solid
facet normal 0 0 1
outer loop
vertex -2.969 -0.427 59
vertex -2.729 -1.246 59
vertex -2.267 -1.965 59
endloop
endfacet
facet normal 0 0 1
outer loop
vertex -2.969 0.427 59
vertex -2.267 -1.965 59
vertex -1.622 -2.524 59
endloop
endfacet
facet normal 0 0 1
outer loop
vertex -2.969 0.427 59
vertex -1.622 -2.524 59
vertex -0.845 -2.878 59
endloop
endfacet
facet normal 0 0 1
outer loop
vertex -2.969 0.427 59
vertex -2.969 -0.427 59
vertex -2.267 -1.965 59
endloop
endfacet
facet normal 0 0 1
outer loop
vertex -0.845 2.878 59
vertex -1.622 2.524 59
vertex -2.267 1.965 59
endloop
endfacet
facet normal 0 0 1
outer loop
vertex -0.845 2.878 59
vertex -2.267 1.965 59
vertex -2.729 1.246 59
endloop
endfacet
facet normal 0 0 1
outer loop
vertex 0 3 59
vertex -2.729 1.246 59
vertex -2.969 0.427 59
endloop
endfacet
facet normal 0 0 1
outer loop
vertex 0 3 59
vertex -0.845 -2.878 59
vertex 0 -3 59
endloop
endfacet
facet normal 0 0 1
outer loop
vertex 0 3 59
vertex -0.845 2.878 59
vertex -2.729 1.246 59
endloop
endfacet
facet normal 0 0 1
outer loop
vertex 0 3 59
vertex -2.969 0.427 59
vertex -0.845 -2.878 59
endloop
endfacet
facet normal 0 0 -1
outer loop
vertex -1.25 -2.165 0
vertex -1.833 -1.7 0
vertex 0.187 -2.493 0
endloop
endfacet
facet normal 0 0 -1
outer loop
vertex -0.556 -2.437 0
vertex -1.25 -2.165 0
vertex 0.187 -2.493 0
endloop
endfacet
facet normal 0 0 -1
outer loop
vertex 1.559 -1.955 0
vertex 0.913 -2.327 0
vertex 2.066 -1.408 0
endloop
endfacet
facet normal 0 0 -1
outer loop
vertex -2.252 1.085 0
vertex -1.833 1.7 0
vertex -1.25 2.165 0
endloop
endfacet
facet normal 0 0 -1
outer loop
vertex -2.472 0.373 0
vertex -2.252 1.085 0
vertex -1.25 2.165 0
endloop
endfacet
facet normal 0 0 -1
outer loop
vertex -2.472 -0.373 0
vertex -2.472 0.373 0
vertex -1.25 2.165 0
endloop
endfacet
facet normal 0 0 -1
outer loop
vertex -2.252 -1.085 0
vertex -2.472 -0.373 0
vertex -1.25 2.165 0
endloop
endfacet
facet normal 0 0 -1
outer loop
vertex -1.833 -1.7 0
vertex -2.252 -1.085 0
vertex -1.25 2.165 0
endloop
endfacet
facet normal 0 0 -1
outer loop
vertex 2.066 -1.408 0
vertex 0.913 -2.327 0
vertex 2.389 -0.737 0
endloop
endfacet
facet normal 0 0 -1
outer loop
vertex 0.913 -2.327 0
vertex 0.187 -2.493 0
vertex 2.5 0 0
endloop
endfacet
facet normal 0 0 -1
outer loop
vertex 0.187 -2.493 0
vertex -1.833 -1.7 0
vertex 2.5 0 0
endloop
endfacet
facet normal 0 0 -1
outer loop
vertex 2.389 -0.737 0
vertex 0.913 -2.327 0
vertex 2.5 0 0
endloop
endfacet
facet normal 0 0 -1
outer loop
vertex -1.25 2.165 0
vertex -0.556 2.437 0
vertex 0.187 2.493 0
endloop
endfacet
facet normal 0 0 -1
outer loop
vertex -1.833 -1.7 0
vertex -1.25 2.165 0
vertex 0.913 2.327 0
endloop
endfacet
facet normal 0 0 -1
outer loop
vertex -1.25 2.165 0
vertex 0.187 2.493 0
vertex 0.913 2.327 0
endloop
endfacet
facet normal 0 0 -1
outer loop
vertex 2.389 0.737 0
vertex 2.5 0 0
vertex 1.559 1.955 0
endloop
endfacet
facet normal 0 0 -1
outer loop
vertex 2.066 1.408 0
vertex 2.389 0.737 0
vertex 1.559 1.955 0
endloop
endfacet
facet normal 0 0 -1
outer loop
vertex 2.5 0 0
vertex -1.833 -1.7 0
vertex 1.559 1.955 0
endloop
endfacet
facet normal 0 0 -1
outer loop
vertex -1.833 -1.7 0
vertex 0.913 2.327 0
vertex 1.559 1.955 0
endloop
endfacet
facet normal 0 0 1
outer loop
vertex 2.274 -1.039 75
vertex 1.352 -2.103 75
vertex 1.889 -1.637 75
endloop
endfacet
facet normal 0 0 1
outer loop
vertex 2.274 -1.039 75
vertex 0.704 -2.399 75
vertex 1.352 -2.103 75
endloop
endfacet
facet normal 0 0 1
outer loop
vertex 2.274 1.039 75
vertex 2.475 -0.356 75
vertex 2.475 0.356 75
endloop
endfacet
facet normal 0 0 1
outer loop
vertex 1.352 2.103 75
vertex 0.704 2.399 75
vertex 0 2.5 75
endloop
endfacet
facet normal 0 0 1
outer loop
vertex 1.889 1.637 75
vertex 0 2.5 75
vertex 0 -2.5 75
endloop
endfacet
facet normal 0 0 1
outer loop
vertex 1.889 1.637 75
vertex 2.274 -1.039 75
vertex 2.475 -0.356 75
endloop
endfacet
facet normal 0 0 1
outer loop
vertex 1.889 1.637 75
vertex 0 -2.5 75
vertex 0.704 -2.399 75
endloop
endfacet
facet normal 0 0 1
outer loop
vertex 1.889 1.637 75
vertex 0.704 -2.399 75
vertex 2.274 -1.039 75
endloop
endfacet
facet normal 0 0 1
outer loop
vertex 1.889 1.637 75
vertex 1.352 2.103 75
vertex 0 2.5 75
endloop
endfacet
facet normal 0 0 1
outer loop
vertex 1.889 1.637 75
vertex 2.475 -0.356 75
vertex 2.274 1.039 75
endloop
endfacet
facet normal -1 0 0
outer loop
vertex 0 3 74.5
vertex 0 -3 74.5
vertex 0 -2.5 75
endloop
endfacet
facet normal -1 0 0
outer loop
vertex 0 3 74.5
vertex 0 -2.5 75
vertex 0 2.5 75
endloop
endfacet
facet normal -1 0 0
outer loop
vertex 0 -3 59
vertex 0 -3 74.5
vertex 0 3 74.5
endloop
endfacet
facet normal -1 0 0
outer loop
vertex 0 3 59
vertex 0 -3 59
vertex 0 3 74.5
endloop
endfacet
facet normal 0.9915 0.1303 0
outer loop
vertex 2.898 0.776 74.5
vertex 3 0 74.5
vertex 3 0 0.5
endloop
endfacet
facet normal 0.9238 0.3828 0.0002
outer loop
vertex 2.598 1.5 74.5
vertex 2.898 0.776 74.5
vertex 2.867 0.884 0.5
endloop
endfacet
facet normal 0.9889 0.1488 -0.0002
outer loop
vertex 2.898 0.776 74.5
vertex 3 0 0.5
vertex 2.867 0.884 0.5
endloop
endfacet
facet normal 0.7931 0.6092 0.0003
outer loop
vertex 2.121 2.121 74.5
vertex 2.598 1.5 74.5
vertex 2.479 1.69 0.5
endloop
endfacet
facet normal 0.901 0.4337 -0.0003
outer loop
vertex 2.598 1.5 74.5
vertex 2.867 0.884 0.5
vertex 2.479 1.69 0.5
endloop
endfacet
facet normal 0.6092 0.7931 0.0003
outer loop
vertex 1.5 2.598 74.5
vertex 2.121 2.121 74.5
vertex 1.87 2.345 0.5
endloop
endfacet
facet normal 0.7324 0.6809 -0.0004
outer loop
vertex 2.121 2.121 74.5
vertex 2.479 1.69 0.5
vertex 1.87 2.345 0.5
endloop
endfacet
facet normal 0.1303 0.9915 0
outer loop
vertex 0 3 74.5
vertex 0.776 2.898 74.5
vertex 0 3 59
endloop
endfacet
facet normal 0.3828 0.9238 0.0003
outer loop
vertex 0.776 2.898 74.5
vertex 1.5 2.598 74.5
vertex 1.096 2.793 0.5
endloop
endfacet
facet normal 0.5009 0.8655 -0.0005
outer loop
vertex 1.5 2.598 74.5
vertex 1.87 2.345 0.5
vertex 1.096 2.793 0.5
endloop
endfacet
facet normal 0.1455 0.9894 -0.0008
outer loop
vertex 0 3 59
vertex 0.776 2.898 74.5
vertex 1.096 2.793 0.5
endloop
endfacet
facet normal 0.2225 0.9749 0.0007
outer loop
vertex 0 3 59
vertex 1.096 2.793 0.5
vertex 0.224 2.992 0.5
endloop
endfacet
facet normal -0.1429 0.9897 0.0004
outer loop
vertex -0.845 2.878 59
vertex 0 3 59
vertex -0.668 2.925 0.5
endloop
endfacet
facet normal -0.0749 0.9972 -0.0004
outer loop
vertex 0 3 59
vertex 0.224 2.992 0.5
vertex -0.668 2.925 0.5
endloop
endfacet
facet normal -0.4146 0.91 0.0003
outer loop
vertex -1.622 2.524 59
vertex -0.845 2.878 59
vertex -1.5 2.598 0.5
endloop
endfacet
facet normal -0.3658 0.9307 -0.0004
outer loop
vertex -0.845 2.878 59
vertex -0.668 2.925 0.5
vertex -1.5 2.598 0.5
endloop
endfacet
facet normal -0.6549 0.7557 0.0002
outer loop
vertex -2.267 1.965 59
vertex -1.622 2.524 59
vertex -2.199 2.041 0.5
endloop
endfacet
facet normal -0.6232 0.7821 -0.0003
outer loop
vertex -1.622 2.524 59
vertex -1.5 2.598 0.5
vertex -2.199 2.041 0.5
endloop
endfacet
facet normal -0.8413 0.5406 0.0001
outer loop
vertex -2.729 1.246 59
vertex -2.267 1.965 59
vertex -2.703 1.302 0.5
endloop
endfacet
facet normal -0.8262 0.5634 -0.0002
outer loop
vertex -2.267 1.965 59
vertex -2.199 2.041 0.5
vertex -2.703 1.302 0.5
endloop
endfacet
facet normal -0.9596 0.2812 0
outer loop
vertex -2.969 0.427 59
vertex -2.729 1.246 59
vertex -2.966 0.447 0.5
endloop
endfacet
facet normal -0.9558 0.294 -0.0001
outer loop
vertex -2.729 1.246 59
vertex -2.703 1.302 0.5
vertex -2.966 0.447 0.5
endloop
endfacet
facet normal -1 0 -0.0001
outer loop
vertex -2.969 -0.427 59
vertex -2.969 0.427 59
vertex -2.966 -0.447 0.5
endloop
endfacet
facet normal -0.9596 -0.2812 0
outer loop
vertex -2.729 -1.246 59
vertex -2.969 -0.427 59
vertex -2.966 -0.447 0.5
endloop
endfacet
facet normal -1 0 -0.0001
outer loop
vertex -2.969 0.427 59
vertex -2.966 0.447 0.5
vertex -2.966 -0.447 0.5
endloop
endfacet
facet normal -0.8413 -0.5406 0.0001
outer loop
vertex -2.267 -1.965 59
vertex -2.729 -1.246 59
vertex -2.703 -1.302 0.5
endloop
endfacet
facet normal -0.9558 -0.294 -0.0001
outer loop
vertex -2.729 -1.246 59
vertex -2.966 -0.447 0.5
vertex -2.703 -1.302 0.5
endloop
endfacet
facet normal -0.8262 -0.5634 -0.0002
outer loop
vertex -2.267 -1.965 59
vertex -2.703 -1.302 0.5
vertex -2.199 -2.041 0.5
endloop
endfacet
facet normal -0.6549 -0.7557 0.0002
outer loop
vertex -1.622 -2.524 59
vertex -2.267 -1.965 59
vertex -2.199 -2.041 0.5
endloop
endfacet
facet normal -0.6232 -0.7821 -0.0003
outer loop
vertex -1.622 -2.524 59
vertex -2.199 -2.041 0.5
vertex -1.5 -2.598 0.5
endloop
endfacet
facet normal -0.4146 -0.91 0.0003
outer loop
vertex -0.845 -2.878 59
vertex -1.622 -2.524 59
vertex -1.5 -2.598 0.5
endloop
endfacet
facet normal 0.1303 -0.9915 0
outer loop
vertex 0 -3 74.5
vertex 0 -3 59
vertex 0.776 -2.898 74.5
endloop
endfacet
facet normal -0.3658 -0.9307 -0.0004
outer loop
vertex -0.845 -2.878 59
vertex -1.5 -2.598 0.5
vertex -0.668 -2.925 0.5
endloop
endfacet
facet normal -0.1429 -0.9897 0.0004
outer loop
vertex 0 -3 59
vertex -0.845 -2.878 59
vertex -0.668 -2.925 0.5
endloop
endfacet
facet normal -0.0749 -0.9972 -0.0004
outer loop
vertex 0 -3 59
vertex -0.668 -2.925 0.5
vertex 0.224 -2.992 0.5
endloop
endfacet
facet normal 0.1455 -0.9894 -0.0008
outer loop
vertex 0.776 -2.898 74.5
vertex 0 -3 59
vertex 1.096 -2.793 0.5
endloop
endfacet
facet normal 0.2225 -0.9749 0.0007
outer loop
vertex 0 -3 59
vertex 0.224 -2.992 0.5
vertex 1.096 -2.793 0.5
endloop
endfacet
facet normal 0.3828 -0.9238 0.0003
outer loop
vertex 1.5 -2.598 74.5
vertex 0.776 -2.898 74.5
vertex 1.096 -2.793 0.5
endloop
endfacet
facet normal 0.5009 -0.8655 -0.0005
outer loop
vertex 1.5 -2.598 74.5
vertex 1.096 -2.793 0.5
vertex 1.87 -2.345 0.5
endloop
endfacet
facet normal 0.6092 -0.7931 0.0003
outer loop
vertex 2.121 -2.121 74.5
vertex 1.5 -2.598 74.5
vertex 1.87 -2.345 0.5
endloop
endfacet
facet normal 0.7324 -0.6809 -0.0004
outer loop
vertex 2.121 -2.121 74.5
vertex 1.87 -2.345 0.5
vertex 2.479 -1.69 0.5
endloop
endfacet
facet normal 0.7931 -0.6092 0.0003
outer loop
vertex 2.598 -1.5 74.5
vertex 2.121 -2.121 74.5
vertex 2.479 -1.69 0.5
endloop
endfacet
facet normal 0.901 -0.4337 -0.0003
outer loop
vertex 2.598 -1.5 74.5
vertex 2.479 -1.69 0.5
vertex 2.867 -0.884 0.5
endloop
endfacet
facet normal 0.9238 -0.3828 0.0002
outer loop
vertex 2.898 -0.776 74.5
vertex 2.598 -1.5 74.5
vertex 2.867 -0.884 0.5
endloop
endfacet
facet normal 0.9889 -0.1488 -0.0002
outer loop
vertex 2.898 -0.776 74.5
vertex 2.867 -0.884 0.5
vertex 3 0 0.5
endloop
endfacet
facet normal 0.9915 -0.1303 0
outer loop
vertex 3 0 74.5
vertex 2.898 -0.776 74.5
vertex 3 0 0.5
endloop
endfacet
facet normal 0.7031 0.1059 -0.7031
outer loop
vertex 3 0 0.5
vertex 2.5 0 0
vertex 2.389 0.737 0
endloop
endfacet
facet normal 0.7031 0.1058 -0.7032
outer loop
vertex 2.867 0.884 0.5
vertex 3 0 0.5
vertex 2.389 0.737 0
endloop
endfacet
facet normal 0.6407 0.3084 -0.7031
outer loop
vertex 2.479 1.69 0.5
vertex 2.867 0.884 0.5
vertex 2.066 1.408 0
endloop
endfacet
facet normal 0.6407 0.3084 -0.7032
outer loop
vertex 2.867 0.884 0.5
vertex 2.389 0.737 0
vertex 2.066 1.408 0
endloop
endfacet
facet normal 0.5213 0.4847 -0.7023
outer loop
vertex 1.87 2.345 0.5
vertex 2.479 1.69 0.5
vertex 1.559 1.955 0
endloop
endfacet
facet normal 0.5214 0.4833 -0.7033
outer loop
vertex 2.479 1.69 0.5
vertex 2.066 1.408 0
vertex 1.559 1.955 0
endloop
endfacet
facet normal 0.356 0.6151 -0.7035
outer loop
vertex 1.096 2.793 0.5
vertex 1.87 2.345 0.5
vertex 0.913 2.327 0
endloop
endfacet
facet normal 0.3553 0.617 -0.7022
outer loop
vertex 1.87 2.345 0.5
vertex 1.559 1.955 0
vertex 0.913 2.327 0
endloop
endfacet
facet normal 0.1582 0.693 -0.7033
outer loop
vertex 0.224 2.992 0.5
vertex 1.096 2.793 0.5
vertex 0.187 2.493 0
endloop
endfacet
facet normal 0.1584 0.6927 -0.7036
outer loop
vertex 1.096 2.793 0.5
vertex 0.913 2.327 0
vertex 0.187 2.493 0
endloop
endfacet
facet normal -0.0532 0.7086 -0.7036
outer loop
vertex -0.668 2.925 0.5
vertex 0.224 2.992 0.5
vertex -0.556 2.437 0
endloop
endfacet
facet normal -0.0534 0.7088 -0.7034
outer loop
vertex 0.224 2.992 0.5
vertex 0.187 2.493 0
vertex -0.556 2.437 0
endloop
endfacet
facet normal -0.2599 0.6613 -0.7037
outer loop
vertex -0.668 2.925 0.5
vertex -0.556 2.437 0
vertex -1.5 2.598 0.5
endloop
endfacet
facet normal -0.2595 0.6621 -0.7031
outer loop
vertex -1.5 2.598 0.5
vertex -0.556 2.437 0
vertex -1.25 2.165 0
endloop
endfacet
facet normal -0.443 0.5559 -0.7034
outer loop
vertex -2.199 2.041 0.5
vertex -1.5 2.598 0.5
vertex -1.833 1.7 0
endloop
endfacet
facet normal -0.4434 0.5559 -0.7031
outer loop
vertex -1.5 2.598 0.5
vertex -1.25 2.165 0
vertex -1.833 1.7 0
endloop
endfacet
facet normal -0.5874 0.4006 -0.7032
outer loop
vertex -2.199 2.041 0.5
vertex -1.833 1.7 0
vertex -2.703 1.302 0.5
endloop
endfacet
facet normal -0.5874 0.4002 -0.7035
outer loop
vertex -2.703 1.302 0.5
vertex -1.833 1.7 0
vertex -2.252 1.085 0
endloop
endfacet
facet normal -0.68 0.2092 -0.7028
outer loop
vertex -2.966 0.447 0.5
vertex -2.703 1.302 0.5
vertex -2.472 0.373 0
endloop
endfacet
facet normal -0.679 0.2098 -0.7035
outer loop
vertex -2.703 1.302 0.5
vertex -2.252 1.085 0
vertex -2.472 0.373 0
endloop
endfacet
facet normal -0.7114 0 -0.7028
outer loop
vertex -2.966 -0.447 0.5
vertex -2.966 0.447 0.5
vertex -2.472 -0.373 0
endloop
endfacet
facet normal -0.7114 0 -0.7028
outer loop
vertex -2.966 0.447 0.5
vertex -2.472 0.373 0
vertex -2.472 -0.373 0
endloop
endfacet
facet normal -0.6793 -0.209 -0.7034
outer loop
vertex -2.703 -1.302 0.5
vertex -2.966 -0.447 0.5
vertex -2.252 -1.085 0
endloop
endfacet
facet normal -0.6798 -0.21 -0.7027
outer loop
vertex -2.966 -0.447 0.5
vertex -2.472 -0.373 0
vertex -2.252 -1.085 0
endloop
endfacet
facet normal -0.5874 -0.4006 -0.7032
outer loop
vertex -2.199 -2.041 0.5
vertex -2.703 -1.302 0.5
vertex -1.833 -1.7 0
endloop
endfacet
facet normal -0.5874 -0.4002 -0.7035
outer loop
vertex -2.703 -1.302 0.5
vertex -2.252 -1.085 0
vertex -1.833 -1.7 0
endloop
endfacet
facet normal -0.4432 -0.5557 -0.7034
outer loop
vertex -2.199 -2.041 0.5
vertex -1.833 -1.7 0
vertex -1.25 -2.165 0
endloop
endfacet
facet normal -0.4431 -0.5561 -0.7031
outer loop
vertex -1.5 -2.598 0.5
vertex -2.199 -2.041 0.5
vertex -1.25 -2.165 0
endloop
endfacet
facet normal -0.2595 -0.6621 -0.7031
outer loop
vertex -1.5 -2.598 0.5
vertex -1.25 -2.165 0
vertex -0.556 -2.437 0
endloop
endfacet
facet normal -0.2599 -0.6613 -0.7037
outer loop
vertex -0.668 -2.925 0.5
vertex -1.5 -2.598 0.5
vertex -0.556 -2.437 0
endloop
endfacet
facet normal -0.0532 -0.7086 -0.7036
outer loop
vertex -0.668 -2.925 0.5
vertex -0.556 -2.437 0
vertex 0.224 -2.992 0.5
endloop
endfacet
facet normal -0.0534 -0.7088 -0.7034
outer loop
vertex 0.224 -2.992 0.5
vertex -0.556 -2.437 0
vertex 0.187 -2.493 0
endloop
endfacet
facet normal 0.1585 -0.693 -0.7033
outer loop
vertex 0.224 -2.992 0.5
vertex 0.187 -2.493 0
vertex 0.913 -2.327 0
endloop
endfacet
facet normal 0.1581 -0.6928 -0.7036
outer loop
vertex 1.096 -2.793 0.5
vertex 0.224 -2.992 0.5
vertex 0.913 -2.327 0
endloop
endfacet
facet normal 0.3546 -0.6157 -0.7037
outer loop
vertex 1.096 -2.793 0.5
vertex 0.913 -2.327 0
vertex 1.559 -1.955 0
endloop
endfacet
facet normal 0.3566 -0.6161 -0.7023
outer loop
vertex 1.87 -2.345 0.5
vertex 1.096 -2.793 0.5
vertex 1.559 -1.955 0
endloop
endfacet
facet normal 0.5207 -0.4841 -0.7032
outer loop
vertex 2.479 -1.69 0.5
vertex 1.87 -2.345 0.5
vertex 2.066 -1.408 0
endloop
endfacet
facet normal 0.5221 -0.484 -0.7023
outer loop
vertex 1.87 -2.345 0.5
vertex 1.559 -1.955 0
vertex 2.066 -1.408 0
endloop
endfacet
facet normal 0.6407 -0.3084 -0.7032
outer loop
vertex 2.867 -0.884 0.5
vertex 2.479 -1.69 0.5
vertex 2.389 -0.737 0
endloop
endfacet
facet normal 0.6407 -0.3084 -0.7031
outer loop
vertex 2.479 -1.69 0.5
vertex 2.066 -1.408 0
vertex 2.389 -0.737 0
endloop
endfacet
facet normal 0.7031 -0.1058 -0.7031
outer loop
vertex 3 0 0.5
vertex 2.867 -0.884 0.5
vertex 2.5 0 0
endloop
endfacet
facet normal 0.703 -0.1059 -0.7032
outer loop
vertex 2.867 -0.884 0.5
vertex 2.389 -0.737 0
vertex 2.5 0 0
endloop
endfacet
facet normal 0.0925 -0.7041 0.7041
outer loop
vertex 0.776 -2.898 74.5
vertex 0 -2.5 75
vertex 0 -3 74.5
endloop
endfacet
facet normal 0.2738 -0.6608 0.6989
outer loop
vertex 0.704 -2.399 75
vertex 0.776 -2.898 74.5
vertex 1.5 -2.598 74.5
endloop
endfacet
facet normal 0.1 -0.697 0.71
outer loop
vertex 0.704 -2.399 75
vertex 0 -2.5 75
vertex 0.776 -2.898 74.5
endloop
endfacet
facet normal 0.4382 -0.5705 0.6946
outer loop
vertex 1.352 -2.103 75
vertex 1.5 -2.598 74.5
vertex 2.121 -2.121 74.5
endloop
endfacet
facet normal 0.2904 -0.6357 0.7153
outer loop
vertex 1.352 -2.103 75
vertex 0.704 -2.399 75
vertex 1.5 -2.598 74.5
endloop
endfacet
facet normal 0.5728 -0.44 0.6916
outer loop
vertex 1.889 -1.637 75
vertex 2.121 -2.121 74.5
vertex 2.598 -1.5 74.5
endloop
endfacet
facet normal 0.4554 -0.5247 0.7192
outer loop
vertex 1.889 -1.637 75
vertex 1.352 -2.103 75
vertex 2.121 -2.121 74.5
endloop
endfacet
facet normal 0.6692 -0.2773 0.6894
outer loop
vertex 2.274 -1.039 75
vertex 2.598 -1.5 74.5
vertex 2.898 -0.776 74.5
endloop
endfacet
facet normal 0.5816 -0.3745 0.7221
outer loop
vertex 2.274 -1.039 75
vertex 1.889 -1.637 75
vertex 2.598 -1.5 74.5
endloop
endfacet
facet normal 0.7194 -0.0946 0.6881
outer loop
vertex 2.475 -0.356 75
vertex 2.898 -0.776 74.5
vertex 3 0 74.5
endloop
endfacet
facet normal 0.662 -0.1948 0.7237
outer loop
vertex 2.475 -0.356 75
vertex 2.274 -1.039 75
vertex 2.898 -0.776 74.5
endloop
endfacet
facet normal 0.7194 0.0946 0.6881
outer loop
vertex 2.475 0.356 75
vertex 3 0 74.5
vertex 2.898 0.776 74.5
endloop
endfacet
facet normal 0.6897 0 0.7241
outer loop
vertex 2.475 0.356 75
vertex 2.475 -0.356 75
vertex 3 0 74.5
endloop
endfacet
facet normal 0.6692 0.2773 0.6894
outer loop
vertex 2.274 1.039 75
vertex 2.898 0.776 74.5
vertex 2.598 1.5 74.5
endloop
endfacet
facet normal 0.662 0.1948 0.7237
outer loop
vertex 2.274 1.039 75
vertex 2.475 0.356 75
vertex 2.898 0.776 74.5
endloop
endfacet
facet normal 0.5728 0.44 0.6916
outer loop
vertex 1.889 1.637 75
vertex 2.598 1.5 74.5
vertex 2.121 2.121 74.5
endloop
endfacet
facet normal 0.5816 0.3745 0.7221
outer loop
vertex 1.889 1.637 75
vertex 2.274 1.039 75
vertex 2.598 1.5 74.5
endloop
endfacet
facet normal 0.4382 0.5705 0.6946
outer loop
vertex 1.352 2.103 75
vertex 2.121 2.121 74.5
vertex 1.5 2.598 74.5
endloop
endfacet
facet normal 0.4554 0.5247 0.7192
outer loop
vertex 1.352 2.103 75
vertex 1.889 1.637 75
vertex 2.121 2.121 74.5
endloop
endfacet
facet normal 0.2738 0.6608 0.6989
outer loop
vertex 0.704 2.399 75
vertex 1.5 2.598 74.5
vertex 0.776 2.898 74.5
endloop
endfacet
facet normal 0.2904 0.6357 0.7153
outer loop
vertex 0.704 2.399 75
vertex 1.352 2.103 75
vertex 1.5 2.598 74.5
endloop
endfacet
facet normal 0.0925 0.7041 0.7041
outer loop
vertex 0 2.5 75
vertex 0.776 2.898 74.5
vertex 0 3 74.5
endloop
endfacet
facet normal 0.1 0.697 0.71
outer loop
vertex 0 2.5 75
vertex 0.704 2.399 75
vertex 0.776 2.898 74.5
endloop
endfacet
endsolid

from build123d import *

# Parameters (mm, degrees)
SKETCH1_R           = 3
BOSS_EXTRUDE1_DEPTH = 75
CHAMFER1_SIZE       = 0.5
CUT_EXTRUDE2_START  = -16
CUT_EXTRUDE2_DEPTH  = 16


with BuildPart() as part:
    # Sketch1 → Boss-Extrude1 (new body)
    with BuildSketch(Plane.XY):
        Circle(SKETCH1_R)
    extrude(amount=BOSS_EXTRUDE1_DEPTH)

    # Chamfer1
    chamfer1_edges = [part.edges().sort_by_distance(p)[0] for p in [
        (-3, 0, 0),
        (-3, 0, 75),
    ]]
    chamfer(chamfer1_edges, length=CHAMFER1_SIZE)

    # Sketch2 → Cut-Extrude2 (cut)
    with BuildSketch(Plane.XY.offset(75).offset(CUT_EXTRUDE2_START)):
        with BuildLine():
            Line((0, -3), (0, 3))
            ThreePointArc((0, 3), (-3, 0), (0, -3))
        make_face()
    extrude(amount=CUT_EXTRUDE2_DEPTH, mode=Mode.SUBTRACT)


solid = part.part
